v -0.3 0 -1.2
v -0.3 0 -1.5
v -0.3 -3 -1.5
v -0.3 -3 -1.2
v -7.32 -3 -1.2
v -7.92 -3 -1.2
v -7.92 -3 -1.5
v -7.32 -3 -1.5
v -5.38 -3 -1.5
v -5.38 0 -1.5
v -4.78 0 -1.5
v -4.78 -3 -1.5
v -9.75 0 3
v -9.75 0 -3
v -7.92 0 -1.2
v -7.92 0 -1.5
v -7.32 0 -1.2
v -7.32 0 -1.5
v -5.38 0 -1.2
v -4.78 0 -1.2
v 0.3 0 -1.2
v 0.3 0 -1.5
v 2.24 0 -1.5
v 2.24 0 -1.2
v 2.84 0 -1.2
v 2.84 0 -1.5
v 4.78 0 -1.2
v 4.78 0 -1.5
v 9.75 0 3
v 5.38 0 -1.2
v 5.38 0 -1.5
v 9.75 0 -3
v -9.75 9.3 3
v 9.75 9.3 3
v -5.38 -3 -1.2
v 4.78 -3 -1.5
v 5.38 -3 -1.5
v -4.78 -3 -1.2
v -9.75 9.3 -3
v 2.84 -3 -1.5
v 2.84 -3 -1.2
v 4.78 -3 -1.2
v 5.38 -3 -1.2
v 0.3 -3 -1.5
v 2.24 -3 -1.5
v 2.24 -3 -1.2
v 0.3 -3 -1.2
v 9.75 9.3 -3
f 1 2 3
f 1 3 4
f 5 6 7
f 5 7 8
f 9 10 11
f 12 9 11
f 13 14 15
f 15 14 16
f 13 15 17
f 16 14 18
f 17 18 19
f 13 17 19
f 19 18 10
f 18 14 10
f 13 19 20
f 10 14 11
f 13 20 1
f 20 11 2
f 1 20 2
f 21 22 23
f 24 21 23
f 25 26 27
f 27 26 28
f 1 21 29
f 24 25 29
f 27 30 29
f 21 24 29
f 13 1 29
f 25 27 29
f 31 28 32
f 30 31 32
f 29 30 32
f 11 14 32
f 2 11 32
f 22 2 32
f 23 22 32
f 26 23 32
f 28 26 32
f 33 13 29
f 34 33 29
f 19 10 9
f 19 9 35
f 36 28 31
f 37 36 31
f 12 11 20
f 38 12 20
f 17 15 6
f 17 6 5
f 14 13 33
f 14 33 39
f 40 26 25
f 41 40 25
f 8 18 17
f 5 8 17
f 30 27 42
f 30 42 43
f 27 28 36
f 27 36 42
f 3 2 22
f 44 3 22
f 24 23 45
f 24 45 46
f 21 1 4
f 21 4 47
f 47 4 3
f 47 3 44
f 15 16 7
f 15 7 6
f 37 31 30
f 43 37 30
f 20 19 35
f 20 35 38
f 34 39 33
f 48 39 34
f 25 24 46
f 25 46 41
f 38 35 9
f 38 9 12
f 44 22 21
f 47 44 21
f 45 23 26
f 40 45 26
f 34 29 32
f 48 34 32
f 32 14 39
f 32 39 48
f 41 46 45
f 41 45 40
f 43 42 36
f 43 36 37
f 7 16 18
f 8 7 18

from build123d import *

# Parameters (mm, degrees)
SKETCH_1_W      = 19.5
SKETCH_1_H      = 6
EXTRUDE_1_DEPTH = 9.3
SKETCH_2_W      = 0.6
SKETCH_2_H      = 0.3
EXTRUDE_2_DEPTH = 3
EXTRUDE_3_DEPTH = 0.2


with BuildPart() as part:
    # Эскиз1 → Бобышка-Вытянуть1 (new body)
    with BuildSketch(Plane(origin=(0, 0, 0), x_dir=(1, 0, 0), z_dir=(0, 1, 0))):
        Rectangle(SKETCH_1_W, SKETCH_1_H)
    extrude(amount=EXTRUDE_1_DEPTH)

    # Эскиз2 → Бобышка-Вытянуть2 (add)
    with BuildSketch(Plane.XZ):
        with Locations((-7.62, -1.35)):
            Rectangle(SKETCH_2_W, SKETCH_2_H)
        with Locations((-5.08, -1.35)):
            Rectangle(SKETCH_2_W, SKETCH_2_H)
        with Locations((0, -1.35)):
            Rectangle(SKETCH_2_W, SKETCH_2_H)
        with Locations((2.54, -1.35)):
            Rectangle(SKETCH_2_W, SKETCH_2_H)
        with Locations((5.08, -1.35)):
            Rectangle(SKETCH_2_W, SKETCH_2_H)
    extrude(amount=EXTRUDE_2_DEPTH)

    # Эскиз3 → Бобышка-Вытянуть3 (add)
    with BuildSketch(Plane(origin=(0, 9.3, 0), x_dir=(1, 0, 0), z_dir=(0, 1, 0))):
        with BuildLine():
            Line((-5.993653669, -1.1506083), (-5.993653669, 1.495225034))
            Line((-5.993653669, 1.495225034), (-5.726526265, 1.495225034))
            add(Edge.make_bspline(
                [(-5.726526265, 1.495225034), (-5.703199399, 1.494894605), (-5.65827213, 1.494258204), (-5.593328368, 1.490121291), (-5.533294043, 1.482863062), (-5.478257825, 1.472268509), (-5.427978548, 1.459234752), (-5.382722262, 1.442777118), (-5.342163377, 1.423550544), (-5.318249105, 1.407525081), (-5.30675463, 1.39982239)],
                knots=[0, 0, 0, 0, 6.998e-05, 0.000134781, 0.00019513, 0.000251262, 0.000302815, 0.000350769, 0.00039557, 0.000437033, 0.000437033, 0.000437033, 0.000437033], degree=3))
            add(Edge.make_bspline(
                [(-5.30675463, 1.39982239), (-5.291259723, 1.387980041), (-5.259666671, 1.363834307), (-5.216878942, 1.320049614), (-5.176018095, 1.270953839), (-5.138198125, 1.215037198), (-5.103093917, 1.153229673), (-5.069860634, 1.085379539), (-5.040008142, 1.011214307), (-5.012613306, 0.931196499), (-4.987736933, 0.846373762), (-4.966676113, 0.756972928), (-4.948733764, 0.663775398), (-4.933891633, 0.566532567), (-4.922334069, 0.465223791), (-4.913792213, 0.359881256), (-4.909099881, 0.250617555), (-4.908492313, 0.176552723), (-4.908183583, 0.138917442)],
                knots=[0, 0, 0, 0, 5.8439e-05, 0.000119153, 0.000183146, 0.000249888, 0.000321348, 0.000396253, 0.000476369, 0.000561014, 0.000649908, 0.00074144, 0.000836447, 0.000934568, 0.00103647, 0.001142284, 0.001251571, 0.001364475, 0.001364475, 0.001364475, 0.001364475], degree=3))
            add(Edge.make_bspline(
                [(-4.908183583, 0.138917442), (-4.908280711, 0.106227192), (-4.908471905, 0.041877192), (-4.913150802, -0.053011126), (-4.919308515, -0.144931602), (-4.928055359, -0.233911091), (-4.940620124, -0.319900369), (-4.954621979, -0.403063397), (-4.971578805, -0.483169429), (-4.991199381, -0.559859585), (-5.012673437, -0.632560972), (-5.036144523, -0.700772196), (-5.060756945, -0.763964681), (-5.08687661, -0.822459494), (-5.11469083, -0.875845291), (-5.14459931, -0.924137506), (-5.175194817, -0.968146848), (-5.208238178, -1.00695942), (-5.243405122, -1.041684613), (-5.282312993, -1.070675465), (-5.324207669, -1.095483025), (-5.369598006, -1.115586755), (-5.418401512, -1.131573487), (-5.470683253, -1.142394162), (-5.525977989, -1.149628644), (-5.56396405, -1.150276458), (-5.583422299, -1.1506083)],
                knots=[0, 0, 0, 0, 9.8058e-05, 0.000193026, 0.000284939, 0.000374436, 0.000461159, 0.000545593, 0.000627403, 0.000706717, 0.000783019, 0.000854758, 0.000923064, 0.000986404, 0.001046858, 0.001103491, 0.001156725, 0.001207487, 0.001256214, 0.001304658, 0.001352653, 0.001402001, 0.001453289, 0.00150641, 0.00156196, 0.0016203, 0.0016203, 0.0016203, 0.0016203], degree=3))
            Line((-5.583422299, -1.1506083), (-5.993653669, -1.1506083))
        make_face()
        with BuildLine():
            Line((-5.857969908, -0.879240778), (-5.712215868, -0.879240778))
            add(Edge.make_bspline(
                [(-5.712215868, -0.879240778), (-5.691187559, -0.879056917), (-5.650871591, -0.878704415), (-5.592868926, -0.875504605), (-5.539970165, -0.870356677), (-5.491975474, -0.863079212), (-5.449019914, -0.853425769), (-5.410665043, -0.842750873), (-5.377422356, -0.829210676), (-5.358215906, -0.817468128), (-5.349155806, -0.811928913)],
                knots=[0, 0, 0, 0, 6.3081e-05, 0.00012094, 0.000174206, 0.000222481, 0.000266459, 0.00030621, 0.000341843, 0.000373662, 0.000373662, 0.000373662, 0.000373662], degree=3))
            add(Edge.make_bspline(
                [(-5.349155806, -0.811928913), (-5.337504042, -0.803307558), (-5.313789347, -0.785760618), (-5.280583663, -0.754767955), (-5.250258232, -0.718316423), (-5.220506136, -0.67810954), (-5.194552767, -0.631854361), (-5.168983681, -0.581836894), (-5.145554456, -0.526783834), (-5.124665533, -0.467032902), (-5.105604787, -0.403212154), (-5.089398291, -0.335730556), (-5.074936985, -0.265071796), (-5.063189934, -0.190820741), (-5.055092671, -0.112940991), (-5.048787041, -0.03182255), (-5.044151944, 0.052648833), (-5.043963526, 0.110113423), (-5.043867344, 0.139447456)],
                knots=[0, 0, 0, 0, 4.3464e-05, 8.8463e-05, 0.000135833, 0.000185556, 0.000238281, 0.000294694, 0.000354058, 0.000417592, 0.000484502, 0.00055379, 0.00062572, 0.000700832, 0.000779205, 0.000860546, 0.000944925, 0.001032914, 0.001032914, 0.001032914, 0.001032914], degree=3))
            add(Edge.make_bspline(
                [(-5.043867344, 0.139447456), (-5.044257686, 0.170367783), (-5.045023027, 0.230993015), (-5.04851762, 0.320105791), (-5.055303295, 0.405703496), (-5.065721936, 0.487818585), (-5.0773982, 0.566813362), (-5.093024206, 0.642256147), (-5.110894459, 0.714268364), (-5.131375406, 0.782633857), (-5.154756204, 0.846351158), (-5.179273421, 0.905648959), (-5.207154577, 0.959280213), (-5.236388534, 1.0081843), (-5.26864597, 1.051395115), (-5.302252635, 1.09000415), (-5.339137971, 1.122477508), (-5.365409332, 1.140706418), (-5.378306614, 1.149655456)],
                knots=[0, 0, 0, 0, 9.2766e-05, 0.000181886, 0.000267496, 0.000350263, 0.000430171, 0.000506986, 0.000581287, 0.000652715, 0.000720955, 0.000784843, 0.000845053, 0.000902138, 0.000955564, 0.001006622, 0.001055435, 0.001102508, 0.001102508, 0.001102508, 0.001102508], degree=3))
            add(Edge.make_bspline(
                [(-5.378306614, 1.149655456), (-5.388955984, 1.155743208), (-5.411039459, 1.168367307), (-5.448391882, 1.183007997), (-5.490098558, 1.195464632), (-5.536608314, 1.206268717), (-5.588034553, 1.213841748), (-5.644095768, 1.219565094), (-5.704918011, 1.223470072), (-5.747013657, 1.223724871), (-5.76892744, 1.223857512)],
                knots=[0, 0, 0, 0, 3.6759e-05, 7.6226e-05, 0.000119987, 0.000167301, 0.000219323, 0.000275807, 0.000336342, 0.000402072, 0.000402072, 0.000402072, 0.000402072], degree=3))
            Line((-5.76892744, 1.223857512), (-5.857969908, 1.223857512))
            Line((-5.857969908, 1.223857512), (-5.857969908, -0.879240778))
        make_face(mode=Mode.SUBTRACT)
        with BuildLine():
            Line((-3.415662216, 1.009731578), (-3.519545095, 0.850727171))
            add(Edge.make_bspline(
                [(-3.519545095, 0.850727171), (-3.534179354, 0.884905992), (-3.562170932, 0.950281296), (-3.611133312, 1.040000729), (-3.665533305, 1.116106536), (-3.72384652, 1.179351808), (-3.785927203, 1.2295169), (-3.851769423, 1.265264449), (-3.920886372, 1.287938638), (-3.968476618, 1.290444177), (-3.992318199, 1.291699393)],
                knots=[0, 0, 0, 0, 0.000111505, 0.00021328, 0.000305946, 0.000391448, 0.000470663, 0.000544181, 0.000615258, 0.000686614, 0.000686614, 0.000686614, 0.000686614], degree=3))
            add(Edge.make_bspline(
                [(-3.992318199, 1.291699393), (-4.005431836, 1.291384283), (-4.03169845, 1.290753119), (-4.070396571, 1.282732829), (-4.108512905, 1.271147784), (-4.145817601, 1.254474313), (-4.182279862, 1.233158987), (-4.218304257, 1.207461497), (-4.252957775, 1.176608367), (-4.299075833, 1.128977162), (-4.352642098, 1.059690199), (-4.408114943, 0.964195578), (-4.457114694, 0.856544197), (-4.497127403, 0.73650285), (-4.529213424, 0.606387938), (-4.552370998, 0.467849217), (-4.566279092, 0.321350851), (-4.568060213, 0.221100812), (-4.568974182, 0.169658294)],
                knots=[0, 0, 0, 0, 3.9278e-05, 7.8675e-05, 0.000118071, 0.000158647, 0.000200919, 0.000244603, 0.000291171, 0.000339898, 0.000443375, 0.000552908, 0.000670553, 0.000797599, 0.000931932, 0.001072217, 0.001218621, 0.001372929, 0.001372929, 0.001372929, 0.001372929], degree=3))
            add(Edge.make_bspline(
                [(-4.568974182, 0.169658294), (-4.568505048, 0.130597956), (-4.567586992, 0.054160166), (-4.559240598, -0.057952809), (-4.546936059, -0.165048085), (-4.528789063, -0.267326934), (-4.505707102, -0.364750482), (-4.477047103, -0.45737923), (-4.443102256, -0.544809514), (-4.404897438, -0.626691155), (-4.362284373, -0.700931952), (-4.317155352, -0.766581502), (-4.268464955, -0.821815298), (-4.217519197, -0.867484278), (-4.163381985, -0.903364651), (-4.106076555, -0.928124148), (-4.046251249, -0.944766536), (-4.0051504, -0.946304829), (-3.984367978, -0.947082659)],
                knots=[0, 0, 0, 0, 0.000117163, 0.000229279, 0.000337095, 0.000440441, 0.000540713, 0.000637275, 0.000731075, 0.000821883, 0.000908068, 0.000987615, 0.00106046, 0.00112842, 0.001192368, 0.001254309, 0.001315115, 0.00137731, 0.00137731, 0.00137731, 0.00137731], degree=3))
            add(Edge.make_bspline(
                [(-3.984367978, -0.947082659), (-3.961591638, -0.945772388), (-3.91597232, -0.943148013), (-3.849479838, -0.921072886), (-3.786097826, -0.886024876), (-3.72623861, -0.836482885), (-3.669438198, -0.773568722), (-3.615488809, -0.697122197), (-3.564594685, -0.606919476), (-3.53506219, -0.540833581), (-3.519545095, -0.506110436)],
                knots=[0, 0, 0, 0, 6.8191e-05, 0.000136581, 0.000207984, 0.00028447, 0.000368503, 0.0004616, 0.000564616, 0.000678669, 0.000678669, 0.000678669, 0.000678669], degree=3))
            Line((-3.519545095, -0.506110436), (-3.415662216, -0.663524799))
            add(Edge.make_bspline(
                [(-3.415662216, -0.663524799), (-3.423957596, -0.684978718), (-3.440269776, -0.727166079), (-3.467335967, -0.787728881), (-3.495194986, -0.84501035), (-3.525867748, -0.89780762), (-3.556548419, -0.947988701), (-3.590310996, -0.993379854), (-3.624691432, -1.035567179), (-3.660650472, -1.073847065), (-3.698141543, -1.107588466), (-3.736619231, -1.137280461), (-3.77637805, -1.161955477), (-3.816885086, -1.183164813), (-3.85890478, -1.199070077), (-3.902132842, -1.210062204), (-3.946310126, -1.217400972), (-3.976211705, -1.218098955), (-3.991258169, -1.21845018)],
                knots=[0, 0, 0, 0, 6.8994e-05, 0.00013567, 0.000198958, 0.000259965, 0.000318787, 0.00037529, 0.000429512, 0.000482002, 0.000532665, 0.000580686, 0.000627598, 0.000672873, 0.000717662, 0.000762012, 0.00080654, 0.000851641, 0.000851641, 0.000851641, 0.000851641], degree=3))
            add(Edge.make_bspline(
                [(-3.991258169, -1.21845018), (-4.019498028, -1.217044905), (-4.0752501, -1.214270565), (-4.156243448, -1.191380627), (-4.232478086, -1.154894405), (-4.303933806, -1.103497233), (-4.369809131, -1.03705277), (-4.431329731, -0.956814193), (-4.488334905, -0.862118671), (-4.520381829, -0.792319622), (-4.5371733, -0.755747355)],
                knots=[0, 0, 0, 0, 8.4598e-05, 0.000167017, 0.000250464, 0.000337091, 0.000429662, 0.000530164, 0.000639786, 0.000760445, 0.000760445, 0.000760445, 0.000760445], degree=3))
            add(Edge.make_bspline(
                [(-4.5371733, -0.755747355), (-4.550705935, -0.722524172), (-4.578175766, -0.655084593), (-4.611354565, -0.549272101), (-4.641067127, -0.438918067), (-4.663731428, -0.323171427), (-4.682780542, -0.202666631), (-4.694840811, -0.076988272), (-4.7032721, 0.053646598), (-4.704190154, 0.142436449), (-4.704657942, 0.187678793)],
                knots=[0, 0, 0, 0, 0.000107577, 0.000218371, 0.000332403, 0.000450276, 0.000572011, 0.000698267, 0.000828893, 0.000964602, 0.000964602, 0.000964602, 0.000964602], degree=3))
            add(Edge.make_bspline(
                [(-4.704657942, 0.187678793), (-4.704071921, 0.235219874), (-4.702922615, 0.328457448), (-4.693182896, 0.465378871), (-4.677450347, 0.596485968), (-4.655352591, 0.721825733), (-4.626464582, 0.841351733), (-4.592607123, 0.955511927), (-4.550817993, 1.063548764), (-4.503763829, 1.164964211), (-4.452114913, 1.257588782), (-4.39660512, 1.338869898), (-4.33732567, 1.407454084), (-4.27538001, 1.464439326), (-4.209548403, 1.508797556), (-4.140164332, 1.539888447), (-4.067577761, 1.559396918), (-4.017878723, 1.561837656), (-3.992848213, 1.563066914)],
                knots=[0, 0, 0, 0, 0.000142609, 0.000279686, 0.000411561, 0.00053861, 0.00066125, 0.000780297, 0.000895559, 0.001008427, 0.001115455, 0.00121337, 0.001303168, 0.001386845, 0.001465196, 0.00154016, 0.001614078, 0.00168908, 0.00168908, 0.00168908, 0.00168908], degree=3))
            add(Edge.make_bspline(
                [(-3.992848213, 1.563066914), (-3.977627939, 1.562703678), (-3.947380615, 1.561981816), (-3.902594067, 1.554813267), (-3.859097397, 1.543179618), (-3.816832763, 1.526858437), (-3.775181493, 1.507110913), (-3.73550092, 1.4809088), (-3.696205136, 1.451551931), (-3.658548924, 1.417201519), (-3.62206409, 1.379288724), (-3.587540342, 1.337134575), (-3.554988139, 1.291302038), (-3.522540397, 1.242799461), (-3.494096057, 1.189331801), (-3.46554633, 1.133068857), (-3.43918824, 1.072902791), (-3.423587095, 1.031011171), (-3.415662216, 1.009731578)],
                knots=[0, 0, 0, 0, 4.5631e-05, 9.0682e-05, 0.00013568, 0.000180469, 0.000226455, 0.00027365, 0.000322836, 0.000373499, 0.000426354, 0.000480576, 0.000536768, 0.000594983, 0.000655472, 0.000718285, 0.000784263, 0.000852377, 0.000852377, 0.000852377, 0.000852377], degree=3))
        make_face()
        with BuildLine():
            Line((-1.448247686, 1.009731578), (-1.552130565, 0.850727171))
            add(Edge.make_bspline(
                [(-1.552130565, 0.850727171), (-1.566764824, 0.884905992), (-1.594756402, 0.950281296), (-1.643718782, 1.040000729), (-1.698118775, 1.116106536), (-1.75643199, 1.179351808), (-1.818512673, 1.2295169), (-1.884354893, 1.265264449), (-1.953471842, 1.287938638), (-2.001062088, 1.290444177), (-2.024903669, 1.291699393)],
                knots=[0, 0, 0, 0, 0.000111505, 0.00021328, 0.000305946, 0.000391448, 0.000470663, 0.000544181, 0.000615258, 0.000686614, 0.000686614, 0.000686614, 0.000686614], degree=3))
            add(Edge.make_bspline(
                [(-2.024903669, 1.291699393), (-2.038017306, 1.291384283), (-2.06428392, 1.290753119), (-2.102982041, 1.282732829), (-2.141098375, 1.271147784), (-2.178403071, 1.254474313), (-2.214865332, 1.233158987), (-2.250889728, 1.207461497), (-2.285543246, 1.176608367), (-2.331661303, 1.128977162), (-2.385227568, 1.059690199), (-2.440700413, 0.964195578), (-2.489700164, 0.856544197), (-2.529712873, 0.73650285), (-2.561798894, 0.606387938), (-2.584956468, 0.467849217), (-2.598864562, 0.321350851), (-2.600645683, 0.221100812), (-2.601559652, 0.169658294)],
                knots=[0, 0, 0, 0, 3.9278e-05, 7.8675e-05, 0.000118071, 0.000158647, 0.000200919, 0.000244603, 0.000291171, 0.000339898, 0.000443375, 0.000552908, 0.000670553, 0.000797599, 0.000931932, 0.001072217, 0.001218621, 0.001372929, 0.001372929, 0.001372929, 0.001372929], degree=3))
            add(Edge.make_bspline(
                [(-2.601559652, 0.169658294), (-2.601090518, 0.130597956), (-2.600172462, 0.054160166), (-2.591826069, -0.057952809), (-2.579521529, -0.165048085), (-2.561374533, -0.267326934), (-2.538292572, -0.364750482), (-2.509632573, -0.45737923), (-2.475687726, -0.544809514), (-2.437482908, -0.626691155), (-2.394869843, -0.700931952), (-2.349740822, -0.766581502), (-2.301050425, -0.821815298), (-2.250104667, -0.867484278), (-2.195967455, -0.903364651), (-2.138662025, -0.928124148), (-2.078836719, -0.944766536), (-2.03773587, -0.946304829), (-2.016953448, -0.947082659)],
                knots=[0, 0, 0, 0, 0.000117163, 0.000229279, 0.000337095, 0.000440441, 0.000540713, 0.000637275, 0.000731075, 0.000821883, 0.000908068, 0.000987615, 0.00106046, 0.00112842, 0.001192368, 0.001254309, 0.001315115, 0.00137731, 0.00137731, 0.00137731, 0.00137731], degree=3))
            add(Edge.make_bspline(
                [(-2.016953448, -0.947082659), (-1.994177108, -0.945772388), (-1.94855779, -0.943148013), (-1.882065308, -0.921072886), (-1.818683296, -0.886024876), (-1.75882408, -0.836482885), (-1.702023668, -0.773568722), (-1.648074279, -0.697122197), (-1.597180155, -0.606919476), (-1.56764766, -0.540833581), (-1.552130565, -0.506110436)],
                knots=[0, 0, 0, 0, 6.8191e-05, 0.000136581, 0.000207984, 0.00028447, 0.000368503, 0.0004616, 0.000564616, 0.000678669, 0.000678669, 0.000678669, 0.000678669], degree=3))
            Line((-1.552130565, -0.506110436), (-1.448247686, -0.663524799))
            add(Edge.make_bspline(
                [(-1.448247686, -0.663524799), (-1.456543066, -0.684978718), (-1.472855246, -0.727166079), (-1.499921437, -0.787728881), (-1.527780456, -0.84501035), (-1.558453218, -0.89780762), (-1.589133889, -0.947988701), (-1.622896466, -0.993379854), (-1.657276903, -1.035567179), (-1.693235942, -1.073847065), (-1.730727013, -1.107588466), (-1.769204701, -1.137280461), (-1.80896352, -1.161955477), (-1.849470556, -1.183164813), (-1.89149025, -1.199070077), (-1.934718312, -1.210062204), (-1.978895596, -1.217400972), (-2.008797175, -1.218098955), (-2.023843639, -1.21845018)],
                knots=[0, 0, 0, 0, 6.8994e-05, 0.00013567, 0.000198958, 0.000259965, 0.000318787, 0.00037529, 0.000429512, 0.000482002, 0.000532665, 0.000580686, 0.000627598, 0.000672873, 0.000717662, 0.000762012, 0.00080654, 0.000851641, 0.000851641, 0.000851641, 0.000851641], degree=3))
            add(Edge.make_bspline(
                [(-2.023843639, -1.21845018), (-2.052083499, -1.217044905), (-2.10783557, -1.214270565), (-2.188828918, -1.191380627), (-2.265063556, -1.154894405), (-2.336519276, -1.103497233), (-2.402394601, -1.03705277), (-2.463915201, -0.956814193), (-2.520920375, -0.862118671), (-2.552967299, -0.792319622), (-2.56975877, -0.755747355)],
                knots=[0, 0, 0, 0, 8.4598e-05, 0.000167017, 0.000250464, 0.000337091, 0.000429662, 0.000530164, 0.000639786, 0.000760445, 0.000760445, 0.000760445, 0.000760445], degree=3))
            add(Edge.make_bspline(
                [(-2.56975877, -0.755747355), (-2.583291406, -0.722524172), (-2.610761236, -0.655084593), (-2.643940035, -0.549272101), (-2.673652597, -0.438918067), (-2.696316898, -0.323171427), (-2.715366012, -0.202666631), (-2.727426281, -0.076988272), (-2.73585757, 0.053646598), (-2.736775624, 0.142436449), (-2.737243412, 0.187678793)],
                knots=[0, 0, 0, 0, 0.000107577, 0.000218371, 0.000332403, 0.000450276, 0.000572011, 0.000698267, 0.000828893, 0.000964602, 0.000964602, 0.000964602, 0.000964602], degree=3))
            add(Edge.make_bspline(
                [(-2.737243412, 0.187678793), (-2.736657391, 0.235219874), (-2.735508085, 0.328457448), (-2.725768366, 0.465378871), (-2.710035817, 0.596485968), (-2.687938062, 0.721825733), (-2.659050052, 0.841351733), (-2.625192593, 0.955511927), (-2.583403463, 1.063548764), (-2.536349299, 1.164964211), (-2.484700383, 1.257588782), (-2.42919059, 1.338869898), (-2.36991114, 1.407454084), (-2.307965481, 1.464439326), (-2.242133873, 1.508797556), (-2.172749802, 1.539888447), (-2.100163231, 1.559396918), (-2.050464193, 1.561837656), (-2.025433684, 1.563066914)],
                knots=[0, 0, 0, 0, 0.000142609, 0.000279686, 0.000411561, 0.00053861, 0.00066125, 0.000780297, 0.000895559, 0.001008427, 0.001115455, 0.00121337, 0.001303168, 0.001386845, 0.001465196, 0.00154016, 0.001614078, 0.00168908, 0.00168908, 0.00168908, 0.00168908], degree=3))
            add(Edge.make_bspline(
                [(-2.025433684, 1.563066914), (-2.010213409, 1.562703678), (-1.979966085, 1.561981816), (-1.935179537, 1.554813267), (-1.891682868, 1.543179618), (-1.849418233, 1.526858437), (-1.807766963, 1.507110913), (-1.76808639, 1.4809088), (-1.728790606, 1.451551931), (-1.691134394, 1.417201519), (-1.65464956, 1.379288724), (-1.620125812, 1.337134575), (-1.587573609, 1.291302038), (-1.555125867, 1.242799461), (-1.526681527, 1.189331801), (-1.4981318, 1.133068857), (-1.47177371, 1.072902791), (-1.456172565, 1.031011171), (-1.448247686, 1.009731578)],
                knots=[0, 0, 0, 0, 4.5631e-05, 9.0682e-05, 0.00013568, 0.000180469, 0.000226455, 0.00027365, 0.000322836, 0.000373499, 0.000426354, 0.000480576, 0.000536768, 0.000594983, 0.000655472, 0.000718285, 0.000784263, 0.000852377, 0.000852377, 0.000852377, 0.000852377], degree=3))
        make_face()
        with BuildLine():
            add(Edge.make_bspline(
                [(-0.786259338, 0.81680623), (-0.768295824, 0.81600169), (-0.732566431, 0.81440146), (-0.680834558, 0.797931704), (-0.631820933, 0.772336496), (-0.584557205, 0.737517515), (-0.540776603, 0.69167794), (-0.499317995, 0.636359406), (-0.460000564, 0.571323038), (-0.437251962, 0.523403355), (-0.425319334, 0.498267402)],
                knots=[0, 0, 0, 0, 5.3744e-05, 0.000106896, 0.00016118, 0.000219166, 0.000282133, 0.000350611, 0.000426238, 0.000509673, 0.000509673, 0.000509673, 0.000509673], degree=3))
            add(Edge.make_bspline(
                [(-0.425319334, 0.498267402), (-0.414728297, 0.473668234), (-0.393285396, 0.423864093), (-0.367227345, 0.345950642), (-0.344949151, 0.264885756), (-0.326032015, 0.180605301), (-0.313037159, 0.092656107), (-0.301778331, 0.001715256), (-0.296325548, -0.092631811), (-0.295403832, -0.15664916), (-0.29493572, -0.189161652)],
                knots=[0, 0, 0, 0, 8.0318e-05, 0.000162614, 0.000246195, 0.000332485, 0.00042154, 0.00051279, 0.000607313, 0.000704858, 0.000704858, 0.000704858, 0.000704858], degree=3))
            add(Edge.make_bspline(
                [(-0.29493572, -0.189161652), (-0.295349578, -0.221853946), (-0.296164678, -0.286241839), (-0.302406615, -0.381280091), (-0.313947295, -0.473153634), (-0.328136117, -0.562148356), (-0.348363023, -0.647748537), (-0.37105115, -0.730502442), (-0.399616521, -0.809793204), (-0.431334519, -0.885135131), (-0.466002773, -0.954682557), (-0.504376532, -1.015419427), (-0.54439823, -1.067563046), (-0.587749138, -1.110045823), (-0.633497994, -1.143475031), (-0.68201447, -1.167387439), (-0.73332845, -1.181735338), (-0.768503084, -1.183591994), (-0.786259338, -1.18452924)],
                knots=[0, 0, 0, 0, 9.8076e-05, 0.000193161, 0.000285527, 0.000375798, 0.000463354, 0.000549262, 0.000633082, 0.000715969, 0.000794428, 0.000865891, 0.000931204, 0.000991173, 0.001047364, 0.001100461, 0.001152664, 0.00120588, 0.00120588, 0.00120588, 0.00120588], degree=3))
            add(Edge.make_bspline(
                [(-0.786259338, -1.18452924), (-0.804011064, -1.183573351), (-0.839347322, -1.181670576), (-0.890886446, -1.167497137), (-0.939563391, -1.143481638), (-0.985339642, -1.109901724), (-1.029169741, -1.067601137), (-1.069769751, -1.015582232), (-1.108089348, -0.954665248), (-1.142724365, -0.885122221), (-1.174700554, -0.80992249), (-1.202146645, -0.73027545), (-1.226196077, -0.647953081), (-1.244970492, -0.561981879), (-1.260604899, -0.473275738), (-1.270903559, -0.381222106), (-1.277484843, -0.286251606), (-1.278252974, -0.221857236), (-1.278642985, -0.189161652)],
                knots=[0, 0, 0, 0, 5.3216e-05, 0.00010593, 0.000159027, 0.000215219, 0.000275568, 0.000341209, 0.000412672, 0.000491131, 0.000574018, 0.000657661, 0.000743715, 0.000831155, 0.000921514, 0.001013817, 0.001108903, 0.001206978, 0.001206978, 0.001206978, 0.001206978], degree=3))
            add(Edge.make_bspline(
                [(-1.278642985, -0.189161652), (-1.278178442, -0.156824813), (-1.277261294, -0.092982179), (-1.271726731, 0.001172955), (-1.260822889, 0.092024459), (-1.246682351, 0.179421159), (-1.228663621, 0.263684197), (-1.206507249, 0.344591254), (-1.180178476, 0.422410198), (-1.158834277, 0.472072399), (-1.148259371, 0.496677358)],
                knots=[0, 0, 0, 0, 9.7016e-05, 0.000191538, 0.000282789, 0.000371404, 0.000457064, 0.000541156, 0.00062295, 0.000703268, 0.000703268, 0.000703268, 0.000703268], degree=3))
            add(Edge.make_bspline(
                [(-1.148259371, 0.496677358), (-1.136349283, 0.522002036), (-1.113704774, 0.570151549), (-1.074129905, 0.635502295), (-1.032470577, 0.691022688), (-0.988335287, 0.736710879), (-0.941784971, 0.772713123), (-0.892146266, 0.797870409), (-0.840124761, 0.814365676), (-0.804223805, 0.81599229), (-0.786259338, 0.81680623)],
                knots=[0, 0, 0, 0, 8.391e-05, 0.000159537, 0.000228758, 0.000291725, 0.000349604, 0.000404359, 0.000458019, 0.000511763, 0.000511763, 0.000511763, 0.000511763], degree=3))
        make_face()
        with BuildLine():
            add(Edge.make_bspline(
                [(-0.786789353, 0.579359649), (-0.798886218, 0.578626652), (-0.82301766, 0.577164431), (-0.858223157, 0.565790098), (-0.891985195, 0.54813109), (-0.924214219, 0.522841727), (-0.955425443, 0.491122233), (-0.984444916, 0.45166165), (-1.012618435, 0.40574868), (-1.03916386, 0.353446946), (-1.063119203, 0.295895135), (-1.08500333, 0.23517698), (-1.103007324, 0.171409901), (-1.117135786, 0.10458493), (-1.128804156, 0.034930636), (-1.137341087, -0.03775207), (-1.142056769, -0.113305513), (-1.142654463, -0.164597934), (-1.142959224, -0.190751696)],
                knots=[0, 0, 0, 0, 3.6231e-05, 7.2276e-05, 0.000109971, 0.000150042, 0.000194642, 0.000243086, 0.000296628, 0.000356124, 0.000418829, 0.000483539, 0.000549644, 0.000617424, 0.000688351, 0.000761457, 0.00083687, 0.000915328, 0.000915328, 0.000915328, 0.000915328], degree=3))
            add(Edge.make_bspline(
                [(-1.142959224, -0.190751696), (-1.142326427, -0.224516359), (-1.141078433, -0.291106612), (-1.131865071, -0.389182871), (-1.117149789, -0.483748531), (-1.096763284, -0.57357852), (-1.071413696, -0.656915723), (-1.040686032, -0.730903139), (-1.007123923, -0.795724965), (-0.968484024, -0.849369276), (-0.926864889, -0.892616434), (-0.88217378, -0.923391467), (-0.835469388, -0.943959249), (-0.80288704, -0.946049798), (-0.786789353, -0.947082659)],
                knots=[0, 0, 0, 0, 0.000101283, 0.000199749, 0.000295251, 0.000388211, 0.000475888, 0.000556206, 0.000628288, 0.000694338, 0.000753929, 0.000807295, 0.000856506, 0.000904562, 0.000904562, 0.000904562, 0.000904562], degree=3))
            add(Edge.make_bspline(
                [(-0.786789353, -0.947082659), (-0.77069017, -0.946051352), (-0.738104797, -0.943963948), (-0.691424169, -0.923371461), (-0.646733496, -0.892772774), (-0.605620341, -0.849183125), (-0.567073213, -0.795601378), (-0.532659256, -0.731179148), (-0.50286572, -0.656761062), (-0.477438741, -0.573529964), (-0.456264431, -0.483823389), (-0.441761172, -0.389172967), (-0.432487835, -0.291109204), (-0.431248093, -0.224517231), (-0.430619481, -0.190751696)],
                knots=[0, 0, 0, 0, 4.8056e-05, 9.7268e-05, 0.000150634, 0.000209853, 0.000275903, 0.000348236, 0.000428353, 0.00051603, 0.000609109, 0.000704611, 0.000803077, 0.00090436, 0.00090436, 0.00090436, 0.00090436], degree=3))
            add(Edge.make_bspline(
                [(-0.430619481, -0.190751696), (-0.430925486, -0.16459819), (-0.431525619, -0.11330627), (-0.43622373, -0.037749215), (-0.444824287, 0.034920411), (-0.456272696, 0.104658662), (-0.471208982, 0.171356384), (-0.489265037, 0.235049505), (-0.51018443, 0.296139923), (-0.535093194, 0.353316751), (-0.561497144, 0.405725377), (-0.589562433, 0.451883468), (-0.619282428, 0.490756408), (-0.649875101, 0.523027156), (-0.68215154, 0.548104718), (-0.715878749, 0.56579737), (-0.750923549, 0.577105458), (-0.774871983, 0.578610634), (-0.786789353, 0.579359649)],
                knots=[0, 0, 0, 0, 7.8458e-05, 0.000153871, 0.000226977, 0.000297904, 0.000365798, 0.000431903, 0.000496436, 0.00055935, 0.000618846, 0.000672388, 0.000721152, 0.000765382, 0.000805454, 0.000843148, 0.000879193, 0.000914897, 0.000914897, 0.000914897, 0.000914897], degree=3))
        make_face(mode=Mode.SUBTRACT)
        with BuildLine():
            Line((-0.057489139, 0.78288529), (0.078194622, 0.78288529))
            Line((0.078194622, 0.78288529), (0.078194622, 0.434135624))
            add(Edge.make_bspline(
                [(0.078194622, 0.434135624), (0.090473003, 0.465415577), (0.113637798, 0.524429355), (0.152949616, 0.604831872), (0.194834574, 0.671538016), (0.238889072, 0.724881992), (0.285305471, 0.765981762), (0.333906321, 0.795133405), (0.385061357, 0.813338806), (0.420090417, 0.815653081), (0.437544582, 0.81680623)],
                knots=[0, 0, 0, 0, 0.000100786, 0.000190147, 0.000268074, 0.000336546, 0.000397026, 0.00045311, 0.000505739, 0.000558007, 0.000558007, 0.000558007, 0.000558007], degree=3))
            add(Edge.make_bspline(
                [(0.437544582, 0.81680623), (0.455045862, 0.815427277), (0.490332639, 0.812646977), (0.541313346, 0.791060513), (0.58784322, 0.755227665), (0.630597175, 0.706886804), (0.668635136, 0.647182672), (0.702902382, 0.578089279), (0.729745898, 0.498723058), (0.748524014, 0.426327988), (0.761213854, 0.361580804), (0.768691001, 0.305613031), (0.775834597, 0.243267015), (0.780778935, 0.174469796), (0.78505622, 0.099200266), (0.788120457, 0.017386139), (0.790404417, -0.070778848), (0.790490142, -0.13174174), (0.790534365, -0.163190932)],
                knots=[0, 0, 0, 0, 5.2396e-05, 0.000105644, 0.000163203, 0.000227379, 0.000298237, 0.000375036, 0.000458179, 0.000549065, 0.000599271, 0.000656013, 0.000718406, 0.000787511, 0.000862893, 0.000944577, 0.001033115, 0.001127459, 0.001127459, 0.001127459, 0.001127459], degree=3))
            Line((0.790534365, -0.163190932), (0.790534365, -1.1506083))
            Line((0.790534365, -1.1506083), (0.654850605, -1.1506083))
            Line((0.654850605, -1.1506083), (0.654850605, -0.241103091))
            add(Edge.make_bspline(
                [(0.654850605, -0.241103091), (0.654901746, -0.214778869), (0.654999567, -0.164426518), (0.654336012, -0.092345224), (0.653763884, -0.02697789), (0.653483685, 0.031507299), (0.65219473, 0.083088841), (0.651385129, 0.127800377), (0.649722976, 0.165603399), (0.648504281, 0.188562951), (0.647960414, 0.198809102)],
                knots=[0, 0, 0, 0, 7.8972e-05, 0.000151056, 0.00021625, 0.000275084, 0.000326506, 0.00037104, 0.000409234, 0.000440016, 0.000440016, 0.000440016, 0.000440016], degree=3))
            add(Edge.make_bspline(
                [(0.647960414, 0.198809102), (0.64571324, 0.228557571), (0.641486532, 0.28451144), (0.62687992, 0.362254523), (0.606153204, 0.428513347), (0.578600593, 0.482865252), (0.545764184, 0.526038935), (0.507034395, 0.556869493), (0.463086331, 0.576376873), (0.43173428, 0.578355115), (0.415813979, 0.579359649)],
                knots=[0, 0, 0, 0, 8.9445e-05, 0.000168238, 0.00023679, 0.000297, 0.000350226, 0.000398154, 0.000444225, 0.000491756, 0.000491756, 0.000491756, 0.000491756], degree=3))
            add(Edge.make_bspline(
                [(0.415813979, 0.579359649), (0.406406609, 0.579000598), (0.387683893, 0.578286007), (0.360081539, 0.570938273), (0.33358275, 0.559116182), (0.307478381, 0.542965196), (0.283097594, 0.521327564), (0.258056496, 0.496442104), (0.235236892, 0.465799284), (0.204330303, 0.41932629), (0.17016809, 0.353300208), (0.137666461, 0.265797944), (0.111887842, 0.169787872), (0.101560782, 0.102299758), (0.096215121, 0.067365458)],
                knots=[0, 0, 0, 0, 2.8171e-05, 5.6066e-05, 8.5018e-05, 0.000115019, 0.00014773, 0.000182586, 0.000220751, 0.000262058, 0.000350012, 0.000442939, 0.000541675, 0.000647632, 0.000647632, 0.000647632, 0.000647632], degree=3))
            add(Edge.make_bspline(
                [(0.096215121, 0.067365458), (0.094722013, 0.054299406), (0.091458026, 0.02573656), (0.088018321, -0.020765347), (0.084618429, -0.074640369), (0.082974455, -0.135808744), (0.080627648, -0.204343685), (0.078962715, -0.280139749), (0.078777293, -0.363360428), (0.078394295, -0.421308327), (0.078194622, -0.451518923)],
                knots=[0, 0, 0, 0, 3.945e-05, 8.6238e-05, 0.000139864, 0.000201382, 0.000269787, 0.000345596, 0.00042881, 0.000519444, 0.000519444, 0.000519444, 0.000519444], degree=3))
            Line((0.078194622, -0.451518923), (0.078194622, -1.1506083))
            Line((0.078194622, -1.1506083), (-0.057489139, -1.1506083))
            Line((-0.057489139, -1.1506083), (-0.057489139, 0.78288529))
        make_face()
        Polygon((0.960139066, 0.78288529), (1.109073194, 0.78288529), (1.418071759, -0.572362273), (1.727070323, 0.78288529), (1.876004451, 0.78288529), (1.435032229, -1.1506083), (1.401111288, -1.1506083), align=None)
        with BuildLine():
            Line((2.889922553, -0.540031376), (2.995395476, -0.650804447))
            add(Edge.make_bspline(
                [(2.995395476, -0.650804447), (2.986843686, -0.680395232), (2.970487553, -0.736990493), (2.942521837, -0.817003839), (2.912057191, -0.887868362), (2.879457332, -0.949958174), (2.845538594, -1.004400122), (2.808633959, -1.051024034), (2.770596064, -1.092025781), (2.729664271, -1.125657126), (2.686351339, -1.152060238), (2.640309908, -1.171116269), (2.591364043, -1.182420247), (2.557661232, -1.183821614), (2.540642872, -1.18452924)],
                knots=[0, 0, 0, 0, 9.2394e-05, 0.000176713, 0.000254103, 0.000323567, 0.000386941, 0.00044621, 0.000501698, 0.000554428, 0.000604603, 0.000653324, 0.00070334, 0.000754356, 0.000754356, 0.000754356, 0.000754356], degree=3))
            add(Edge.make_bspline(
                [(2.540642872, -1.18452924), (2.521647414, -1.183640859), (2.484157345, -1.181887521), (2.429827944, -1.167040394), (2.379028756, -1.142547769), (2.331434963, -1.108631038), (2.287208639, -1.064982098), (2.246363966, -1.011876656), (2.208773445, -0.949358119), (2.175199734, -0.878407616), (2.14487345, -0.80181485), (2.118547256, -0.721543549), (2.095394935, -0.638913847), (2.077792903, -0.553454635), (2.063477122, -0.465928955), (2.052550216, -0.375963316), (2.046997499, -0.283399275), (2.046075144, -0.220792035), (2.045609152, -0.189161652)],
                knots=[0, 0, 0, 0, 5.6912e-05, 0.000112323, 0.000167559, 0.000225353, 0.000286821, 0.000353295, 0.000425831, 0.000505245, 0.00058851, 0.000672815, 0.000758581, 0.000845796, 0.000934411, 0.001024609, 0.001117544, 0.001212441, 0.001212441, 0.001212441, 0.001212441], degree=3))
            add(Edge.make_bspline(
                [(2.045609152, -0.189161652), (2.045873668, -0.15947328), (2.04639684, -0.100754205), (2.051786754, -0.01391278), (2.060890014, 0.070583535), (2.073022901, 0.152637188), (2.088213979, 0.232307843), (2.107431802, 0.309412503), (2.130019131, 0.384099099), (2.148006457, 0.4324547), (2.156912237, 0.456396241)],
                knots=[0, 0, 0, 0, 8.9057e-05, 0.000176141, 0.000260893, 0.000343945, 0.000424919, 0.000504105, 0.000582235, 0.000658852, 0.000658852, 0.000658852, 0.000658852], degree=3))
            add(Edge.make_bspline(
                [(2.156912237, 0.456396241), (2.168632995, 0.484695311), (2.191034257, 0.538781819), (2.230346554, 0.612710631), (2.273772183, 0.674835599), (2.319012731, 0.726769821), (2.368669983, 0.766678288), (2.420853593, 0.796196308), (2.477065364, 0.813266793), (2.515446352, 0.815619232), (2.534812711, 0.81680623)],
                knots=[0, 0, 0, 0, 9.1865e-05, 0.000175578, 0.000250565, 0.000318877, 0.000381455, 0.00044076, 0.00049777, 0.000555835, 0.000555835, 0.000555835, 0.000555835], degree=3))
            add(Edge.make_bspline(
                [(2.534812711, 0.81680623), (2.554748952, 0.815766124), (2.594405397, 0.813697184), (2.65183856, 0.794307188), (2.706052042, 0.764148707), (2.757036124, 0.721954325), (2.803761609, 0.667157498), (2.84741589, 0.600847797), (2.889054115, 0.523315753), (2.911878401, 0.466198207), (2.923843493, 0.436255683)],
                knots=[0, 0, 0, 0, 5.9647e-05, 0.000118648, 0.000179857, 0.000245006, 0.000316006, 0.000395092, 0.000482825, 0.000579493, 0.000579493, 0.000579493, 0.000579493], degree=3))
            add(Edge.make_bspline(
                [(2.923843493, 0.436255683), (2.932239182, 0.413201379), (2.949323145, 0.366289341), (2.97040868, 0.292615183), (2.988276388, 0.214921509), (3.003065321, 0.133027608), (3.014880028, 0.047109802), (3.022341437, -0.043136194), (3.02798877, -0.137504611), (3.028867626, -0.201873), (3.029316417, -0.234742915)],
                knots=[0, 0, 0, 0, 7.3588e-05, 0.000149741, 0.00022971, 0.00031267, 0.000399321, 0.000489773, 0.000584265, 0.00068287, 0.00068287, 0.00068287, 0.00068287], degree=3))
            Line((3.029316417, -0.234742915), (2.181292912, -0.234742915))
            add(Edge.make_bspline(
                [(2.181292912, -0.234742915), (2.181678495, -0.260200358), (2.182434624, -0.310122463), (2.188977195, -0.383062876), (2.196139028, -0.452732985), (2.208276721, -0.518418832), (2.222091078, -0.580931888), (2.240558167, -0.639413961), (2.260293019, -0.695188709), (2.284027297, -0.746442985), (2.309787431, -0.793118227), (2.337226816, -0.833957866), (2.365822227, -0.868954932), (2.396201902, -0.897441422), (2.428280632, -0.919689367), (2.462240249, -0.935137296), (2.497484372, -0.945279826), (2.521671877, -0.946482143), (2.533752681, -0.947082659)],
                knots=[0, 0, 0, 0, 7.6352e-05, 0.000149726, 0.000219611, 0.000286359, 0.000350001, 0.000411531, 0.000470216, 0.000527372, 0.000580756, 0.000630002, 0.000674791, 0.000716043, 0.00075456, 0.000791319, 0.000827577, 0.000863758, 0.000863758, 0.000863758, 0.000863758], degree=3))
            add(Edge.make_bspline(
                [(2.533752681, -0.947082659), (2.545639735, -0.946606939), (2.569542184, -0.945650364), (2.604974005, -0.936674712), (2.639639986, -0.922120349), (2.67346179, -0.902275022), (2.70623002, -0.878366002), (2.735712001, -0.849147568), (2.763591626, -0.817379685), (2.789389289, -0.780548935), (2.813785808, -0.735605494), (2.838760192, -0.680839707), (2.864834398, -0.614459415), (2.881140963, -0.566083374), (2.889922553, -0.540031376)],
                knots=[0, 0, 0, 0, 3.561e-05, 7.1604e-05, 0.000108909, 0.000148091, 0.000189008, 0.00023024, 0.000272322, 0.0003157, 0.000364811, 0.00042552, 0.000496187, 0.000578655, 0.000578655, 0.000578655, 0.000578655], degree=3))
        make_face()
        with BuildLine():
            add(Edge.make_bspline(
                [(2.893632656, 0.002703666), (2.889284009, 0.034010969), (2.881026115, 0.093462193), (2.865510163, 0.177480153), (2.846565928, 0.2513368), (2.824740419, 0.316092891), (2.799611473, 0.373076112), (2.771085822, 0.423985739), (2.738043629, 0.468621467), (2.702141544, 0.507162291), (2.664626545, 0.539697143), (2.624200455, 0.561871031), (2.583241391, 0.577163797), (2.555082473, 0.57863361), (2.541172887, 0.579359649)],
                knots=[0, 0, 0, 0, 9.4819e-05, 0.000180058, 0.000256161, 0.000323372, 0.000384829, 0.000442746, 0.000498081, 0.000550958, 0.000600633, 0.000646192, 0.000688765, 0.000730323, 0.000730323, 0.000730323, 0.000730323], degree=3))
            add(Edge.make_bspline(
                [(2.541172887, 0.579359649), (2.529816757, 0.578884512), (2.507133469, 0.577935449), (2.47385806, 0.569147519), (2.442189002, 0.554200788), (2.410982235, 0.534723183), (2.382227004, 0.508241261), (2.354132644, 0.476873625), (2.327269582, 0.439956298), (2.31141713, 0.412390057), (2.303196291, 0.398094625)],
                knots=[0, 0, 0, 0, 3.4024e-05, 6.7962e-05, 0.000102352, 0.000138815, 0.000177856, 0.000219143, 0.000265047, 0.000314495, 0.000314495, 0.000314495, 0.000314495], degree=3))
            add(Edge.make_bspline(
                [(2.303196291, 0.398094625), (2.297196818, 0.386514034), (2.284674217, 0.362342057), (2.268605675, 0.323043588), (2.25313396, 0.279922048), (2.238820492, 0.232510016), (2.225838271, 0.18081587), (2.213491386, 0.125196651), (2.203104027, 0.065346625), (2.196768047, 0.02409169), (2.19348325, 0.002703666)],
                knots=[0, 0, 0, 0, 3.911e-05, 8.1633e-05, 0.000127233, 0.000176527, 0.000230132, 0.000287103, 0.000347404, 0.000412322, 0.000412322, 0.000412322, 0.000412322], degree=3))
            Line((2.19348325, 0.002703666), (2.893632656, 0.002703666))
        make_face(mode=Mode.SUBTRACT)
        with BuildLine():
            Line((3.232842058, 0.78288529), (3.368525818, 0.78288529))
            Line((3.368525818, 0.78288529), (3.368525818, 0.498267402))
            add(Edge.make_bspline(
                [(3.368525818, 0.498267402), (3.377158654, 0.524552332), (3.393329778, 0.573789553), (3.42143135, 0.640457161), (3.449280172, 0.695972089), (3.478235876, 0.740367655), (3.508981153, 0.773639524), (3.5391453, 0.798808716), (3.571522866, 0.813693408), (3.593653396, 0.815789862), (3.604382355, 0.81680623)],
                knots=[0, 0, 0, 0, 8.2969e-05, 0.000155418, 0.000216813, 0.000269145, 0.000313783, 0.000352274, 0.000386446, 0.000418603, 0.000418603, 0.000418603, 0.000418603], degree=3))
            add(Edge.make_bspline(
                [(3.604382355, 0.81680623), (3.612636765, 0.815852155), (3.63030099, 0.813810458), (3.656311976, 0.800158343), (3.682996722, 0.779137474), (3.699041042, 0.760599725), (3.70773522, 0.750554394)],
                knots=[0, 0, 0, 0, 2.4747e-05, 5.2957e-05, 8.6566e-05, 0.000126321, 0.000126321, 0.000126321, 0.000126321], degree=3))
            Line((3.70773522, 0.750554394), (3.642543413, 0.544908694))
            add(Edge.make_bspline(
                [(3.642543413, 0.544908694), (3.636790337, 0.549953037), (3.626169317, 0.559265631), (3.610540938, 0.570655945), (3.595769021, 0.577862983), (3.586068266, 0.578887071), (3.581591724, 0.579359649)],
                knots=[0, 0, 0, 0, 2.2938e-05, 4.2347e-05, 5.8007e-05, 7.1426e-05, 7.1426e-05, 7.1426e-05, 7.1426e-05], degree=3))
            add(Edge.make_bspline(
                [(3.581591724, 0.579359649), (3.571757888, 0.578001124), (3.550680791, 0.575089364), (3.522244285, 0.55270439), (3.494902966, 0.520205459), (3.467988632, 0.474936295), (3.443312282, 0.416541398), (3.422235918, 0.344225662), (3.403069108, 0.258414172), (3.39437154, 0.196066367), (3.389726406, 0.162768103)],
                knots=[0, 0, 0, 0, 2.9319e-05, 6.284e-05, 0.000104922, 0.000157007, 0.00021992, 0.000294699, 0.000382656, 0.000483477, 0.000483477, 0.000483477, 0.000483477], degree=3))
            add(Edge.make_bspline(
                [(3.389726406, 0.162768103), (3.388046347, 0.147406041), (3.38430524, 0.113198246), (3.380334433, 0.056444872), (3.376687708, -0.01087533), (3.37343455, -0.088612162), (3.371563998, -0.176789024), (3.369950645, -0.275372709), (3.368916238, -0.38455846), (3.368659912, -0.460882316), (3.368525818, -0.500810289)],
                knots=[0, 0, 0, 0, 4.6357e-05, 0.000103227, 0.000170641, 0.000248618, 0.000336626, 0.000435222, 0.00054441, 0.000664194, 0.000664194, 0.000664194, 0.000664194], degree=3))
            Line((3.368525818, -0.500810289), (3.368525818, -1.1506083))
            Line((3.368525818, -1.1506083), (3.232842058, -1.1506083))
            Line((3.232842058, -1.1506083), (3.232842058, 0.78288529))
        make_face()
        Polygon((3.911260861, 1.563066914), (4.046944622, 1.563066914), (4.046944622, 0.78288529), (4.216549323, 0.78288529), (4.216549323, 0.545438709), (4.046944622, 0.545438709), (4.046944622, -1.1506083), (3.911260861, -1.1506083), (3.911260861, 0.545438709), (3.74165616, 0.545438709), (3.74165616, 0.78288529), (3.911260861, 0.78288529), align=None)
        with BuildLine():
            Line((5.230467425, -0.540031376), (5.335940348, -0.650804447))
            add(Edge.make_bspline(
                [(5.335940348, -0.650804447), (5.327388558, -0.680395232), (5.311032425, -0.736990493), (5.283066708, -0.817003839), (5.252602063, -0.887868362), (5.220002204, -0.949958174), (5.186083466, -1.004400122), (5.149178831, -1.051024034), (5.111140936, -1.092025781), (5.070209142, -1.125657126), (5.026896211, -1.152060238), (4.98085478, -1.171116269), (4.931908915, -1.182420247), (4.898206104, -1.183821614), (4.881187744, -1.18452924)],
                knots=[0, 0, 0, 0, 9.2394e-05, 0.000176713, 0.000254103, 0.000323567, 0.000386941, 0.00044621, 0.000501698, 0.000554428, 0.000604603, 0.000653324, 0.00070334, 0.000754356, 0.000754356, 0.000754356, 0.000754356], degree=3))
            add(Edge.make_bspline(
                [(4.881187744, -1.18452924), (4.862192286, -1.183640859), (4.824702217, -1.181887521), (4.770372815, -1.167040394), (4.719573628, -1.142547769), (4.671979834, -1.108631038), (4.62775351, -1.064982098), (4.586908837, -1.011876656), (4.549318317, -0.949358119), (4.515744605, -0.878407616), (4.485418322, -0.80181485), (4.459092128, -0.721543549), (4.435939807, -0.638913847), (4.418337775, -0.553454635), (4.404021994, -0.465928955), (4.393095087, -0.375963316), (4.387542371, -0.283399275), (4.386620015, -0.220792035), (4.386154023, -0.189161652)],
                knots=[0, 0, 0, 0, 5.6912e-05, 0.000112323, 0.000167559, 0.000225353, 0.000286821, 0.000353295, 0.000425831, 0.000505245, 0.00058851, 0.000672815, 0.000758581, 0.000845796, 0.000934411, 0.001024609, 0.001117544, 0.001212441, 0.001212441, 0.001212441, 0.001212441], degree=3))
            add(Edge.make_bspline(
                [(4.386154023, -0.189161652), (4.38641854, -0.15947328), (4.386941712, -0.100754205), (4.392331626, -0.01391278), (4.401434885, 0.070583535), (4.413567773, 0.152637188), (4.428758851, 0.232307843), (4.447976673, 0.309412503), (4.470564003, 0.384099099), (4.488551329, 0.4324547), (4.497457108, 0.456396241)],
                knots=[0, 0, 0, 0, 8.9057e-05, 0.000176141, 0.000260893, 0.000343945, 0.000424919, 0.000504105, 0.000582235, 0.000658852, 0.000658852, 0.000658852, 0.000658852], degree=3))
            add(Edge.make_bspline(
                [(4.497457108, 0.456396241), (4.509177866, 0.484695311), (4.531579128, 0.538781819), (4.570891426, 0.612710631), (4.614317055, 0.674835599), (4.659557603, 0.726769821), (4.709214855, 0.766678288), (4.761398465, 0.796196308), (4.817610236, 0.813266793), (4.855991224, 0.815619232), (4.875357583, 0.81680623)],
                knots=[0, 0, 0, 0, 9.1865e-05, 0.000175578, 0.000250565, 0.000318877, 0.000381455, 0.00044076, 0.00049777, 0.000555835, 0.000555835, 0.000555835, 0.000555835], degree=3))
            add(Edge.make_bspline(
                [(4.875357583, 0.81680623), (4.895293824, 0.815766124), (4.934950269, 0.813697184), (4.992383432, 0.794307188), (5.046596914, 0.764148707), (5.097580996, 0.721954325), (5.144306481, 0.667157498), (5.187960762, 0.600847797), (5.229598987, 0.523315753), (5.252423273, 0.466198207), (5.264388365, 0.436255683)],
                knots=[0, 0, 0, 0, 5.9647e-05, 0.000118648, 0.000179857, 0.000245006, 0.000316006, 0.000395092, 0.000482825, 0.000579493, 0.000579493, 0.000579493, 0.000579493], degree=3))
            add(Edge.make_bspline(
                [(5.264388365, 0.436255683), (5.272784054, 0.413201379), (5.289868017, 0.366289341), (5.310953551, 0.292615183), (5.32882126, 0.214921509), (5.343610193, 0.133027608), (5.3554249, 0.047109802), (5.362886308, -0.043136194), (5.368533642, -0.137504611), (5.369412498, -0.201873), (5.369861288, -0.234742915)],
                knots=[0, 0, 0, 0, 7.3588e-05, 0.000149741, 0.00022971, 0.00031267, 0.000399321, 0.000489773, 0.000584265, 0.00068287, 0.00068287, 0.00068287, 0.00068287], degree=3))
            Line((5.369861288, -0.234742915), (4.521837784, -0.234742915))
            add(Edge.make_bspline(
                [(4.521837784, -0.234742915), (4.522223367, -0.260200358), (4.522979496, -0.310122463), (4.529522067, -0.383062876), (4.5366839, -0.452732985), (4.548821593, -0.518418832), (4.56263595, -0.580931888), (4.581103039, -0.639413961), (4.600837891, -0.695188709), (4.624572169, -0.746442985), (4.650332302, -0.793118227), (4.677771688, -0.833957866), (4.706367098, -0.868954932), (4.736746774, -0.897441422), (4.768825504, -0.919689367), (4.802785121, -0.935137296), (4.838029244, -0.945279826), (4.862216749, -0.946482143), (4.874297553, -0.947082659)],
                knots=[0, 0, 0, 0, 7.6352e-05, 0.000149726, 0.000219611, 0.000286359, 0.000350001, 0.000411531, 0.000470216, 0.000527372, 0.000580756, 0.000630002, 0.000674791, 0.000716043, 0.00075456, 0.000791319, 0.000827577, 0.000863758, 0.000863758, 0.000863758, 0.000863758], degree=3))
            add(Edge.make_bspline(
                [(4.874297553, -0.947082659), (4.886184606, -0.946606939), (4.910087056, -0.945650364), (4.945518877, -0.936674712), (4.980184858, -0.922120349), (5.014006662, -0.902275022), (5.046774892, -0.878366002), (5.076256872, -0.849147568), (5.104136498, -0.817379685), (5.129934161, -0.780548935), (5.154330679, -0.735605494), (5.179305064, -0.680839707), (5.20537927, -0.614459415), (5.221685835, -0.566083374), (5.230467425, -0.540031376)],
                knots=[0, 0, 0, 0, 3.561e-05, 7.1604e-05, 0.000108909, 0.000148091, 0.000189008, 0.00023024, 0.000272322, 0.0003157, 0.000364811, 0.00042552, 0.000496187, 0.000578655, 0.000578655, 0.000578655, 0.000578655], degree=3))
        make_face()
        with BuildLine():
            add(Edge.make_bspline(
                [(5.234177528, 0.002703666), (5.229828881, 0.034010969), (5.221570987, 0.093462193), (5.206055035, 0.177480153), (5.1871108, 0.2513368), (5.165285291, 0.316092891), (5.140156345, 0.373076112), (5.111630694, 0.423985739), (5.078588501, 0.468621467), (5.042686416, 0.507162291), (5.005171417, 0.539697143), (4.964745327, 0.561871031), (4.923786263, 0.577163797), (4.895627345, 0.57863361), (4.881717759, 0.579359649)],
                knots=[0, 0, 0, 0, 9.4819e-05, 0.000180058, 0.000256161, 0.000323372, 0.000384829, 0.000442746, 0.000498081, 0.000550958, 0.000600633, 0.000646192, 0.000688765, 0.000730323, 0.000730323, 0.000730323, 0.000730323], degree=3))
            add(Edge.make_bspline(
                [(4.881717759, 0.579359649), (4.870361629, 0.578884512), (4.84767834, 0.577935449), (4.814402932, 0.569147519), (4.782733873, 0.554200788), (4.751527107, 0.534723183), (4.722771876, 0.508241261), (4.694677516, 0.476873625), (4.667814453, 0.439956298), (4.651962002, 0.412390057), (4.643741163, 0.398094625)],
                knots=[0, 0, 0, 0, 3.4024e-05, 6.7962e-05, 0.000102352, 0.000138815, 0.000177856, 0.000219143, 0.000265047, 0.000314495, 0.000314495, 0.000314495, 0.000314495], degree=3))
            add(Edge.make_bspline(
                [(4.643741163, 0.398094625), (4.63774169, 0.386514034), (4.625219089, 0.362342057), (4.609150547, 0.323043588), (4.593678832, 0.279922048), (4.579365364, 0.232510016), (4.566383143, 0.18081587), (4.554036258, 0.125196651), (4.543648899, 0.065346625), (4.537312919, 0.02409169), (4.534028122, 0.002703666)],
                knots=[0, 0, 0, 0, 3.911e-05, 8.1633e-05, 0.000127233, 0.000176527, 0.000230132, 0.000287103, 0.000347404, 0.000412322, 0.000412322, 0.000412322, 0.000412322], degree=3))
            Line((4.534028122, 0.002703666), (5.234177528, 0.002703666))
        make_face(mode=Mode.SUBTRACT)
        with BuildLine():
            Line((5.573386929, 0.78288529), (5.70907069, 0.78288529))
            Line((5.70907069, 0.78288529), (5.70907069, 0.498267402))
            add(Edge.make_bspline(
                [(5.70907069, 0.498267402), (5.717703526, 0.524552332), (5.73387465, 0.573789553), (5.761976222, 0.640457161), (5.789825043, 0.695972089), (5.818780748, 0.740367655), (5.849526025, 0.773639524), (5.879690172, 0.798808716), (5.912067738, 0.813693408), (5.934198268, 0.815789862), (5.944927227, 0.81680623)],
                knots=[0, 0, 0, 0, 8.2969e-05, 0.000155418, 0.000216813, 0.000269145, 0.000313783, 0.000352274, 0.000386446, 0.000418603, 0.000418603, 0.000418603, 0.000418603], degree=3))
            add(Edge.make_bspline(
                [(5.944927227, 0.81680623), (5.953181637, 0.815852155), (5.970845861, 0.813810458), (5.996856848, 0.800158343), (6.023541594, 0.779137474), (6.039585914, 0.760599725), (6.048280092, 0.750554394)],
                knots=[0, 0, 0, 0, 2.4747e-05, 5.2957e-05, 8.6566e-05, 0.000126321, 0.000126321, 0.000126321, 0.000126321], degree=3))
            Line((6.048280092, 0.750554394), (5.983088285, 0.544908694))
            add(Edge.make_bspline(
                [(5.983088285, 0.544908694), (5.977335209, 0.549953037), (5.966714189, 0.559265631), (5.95108581, 0.570655945), (5.936313892, 0.577862983), (5.926613138, 0.578887071), (5.922136596, 0.579359649)],
                knots=[0, 0, 0, 0, 2.2938e-05, 4.2347e-05, 5.8007e-05, 7.1426e-05, 7.1426e-05, 7.1426e-05, 7.1426e-05], degree=3))
            add(Edge.make_bspline(
                [(5.922136596, 0.579359649), (5.912302759, 0.578001124), (5.891225663, 0.575089364), (5.862789157, 0.55270439), (5.835447838, 0.520205459), (5.808533504, 0.474936295), (5.783857153, 0.416541398), (5.76278079, 0.344225662), (5.743613979, 0.258414172), (5.734916412, 0.196066367), (5.730271278, 0.162768103)],
                knots=[0, 0, 0, 0, 2.9319e-05, 6.284e-05, 0.000104922, 0.000157007, 0.00021992, 0.000294699, 0.000382656, 0.000483477, 0.000483477, 0.000483477, 0.000483477], degree=3))
            add(Edge.make_bspline(
                [(5.730271278, 0.162768103), (5.728591219, 0.147406041), (5.724850112, 0.113198246), (5.720879305, 0.056444872), (5.71723258, -0.01087533), (5.713979422, -0.088612162), (5.712108869, -0.176789024), (5.710495517, -0.275372709), (5.70946111, -0.38455846), (5.709204784, -0.460882316), (5.70907069, -0.500810289)],
                knots=[0, 0, 0, 0, 4.6357e-05, 0.000103227, 0.000170641, 0.000248618, 0.000336626, 0.000435222, 0.00054441, 0.000664194, 0.000664194, 0.000664194, 0.000664194], degree=3))
            Line((5.70907069, -0.500810289), (5.70907069, -1.1506083))
            Line((5.70907069, -1.1506083), (5.573386929, -1.1506083))
            Line((5.573386929, -1.1506083), (5.573386929, 0.78288529))
        make_face()
    extrude(amount=-EXTRUDE_3_DEPTH)


solid = part.part
